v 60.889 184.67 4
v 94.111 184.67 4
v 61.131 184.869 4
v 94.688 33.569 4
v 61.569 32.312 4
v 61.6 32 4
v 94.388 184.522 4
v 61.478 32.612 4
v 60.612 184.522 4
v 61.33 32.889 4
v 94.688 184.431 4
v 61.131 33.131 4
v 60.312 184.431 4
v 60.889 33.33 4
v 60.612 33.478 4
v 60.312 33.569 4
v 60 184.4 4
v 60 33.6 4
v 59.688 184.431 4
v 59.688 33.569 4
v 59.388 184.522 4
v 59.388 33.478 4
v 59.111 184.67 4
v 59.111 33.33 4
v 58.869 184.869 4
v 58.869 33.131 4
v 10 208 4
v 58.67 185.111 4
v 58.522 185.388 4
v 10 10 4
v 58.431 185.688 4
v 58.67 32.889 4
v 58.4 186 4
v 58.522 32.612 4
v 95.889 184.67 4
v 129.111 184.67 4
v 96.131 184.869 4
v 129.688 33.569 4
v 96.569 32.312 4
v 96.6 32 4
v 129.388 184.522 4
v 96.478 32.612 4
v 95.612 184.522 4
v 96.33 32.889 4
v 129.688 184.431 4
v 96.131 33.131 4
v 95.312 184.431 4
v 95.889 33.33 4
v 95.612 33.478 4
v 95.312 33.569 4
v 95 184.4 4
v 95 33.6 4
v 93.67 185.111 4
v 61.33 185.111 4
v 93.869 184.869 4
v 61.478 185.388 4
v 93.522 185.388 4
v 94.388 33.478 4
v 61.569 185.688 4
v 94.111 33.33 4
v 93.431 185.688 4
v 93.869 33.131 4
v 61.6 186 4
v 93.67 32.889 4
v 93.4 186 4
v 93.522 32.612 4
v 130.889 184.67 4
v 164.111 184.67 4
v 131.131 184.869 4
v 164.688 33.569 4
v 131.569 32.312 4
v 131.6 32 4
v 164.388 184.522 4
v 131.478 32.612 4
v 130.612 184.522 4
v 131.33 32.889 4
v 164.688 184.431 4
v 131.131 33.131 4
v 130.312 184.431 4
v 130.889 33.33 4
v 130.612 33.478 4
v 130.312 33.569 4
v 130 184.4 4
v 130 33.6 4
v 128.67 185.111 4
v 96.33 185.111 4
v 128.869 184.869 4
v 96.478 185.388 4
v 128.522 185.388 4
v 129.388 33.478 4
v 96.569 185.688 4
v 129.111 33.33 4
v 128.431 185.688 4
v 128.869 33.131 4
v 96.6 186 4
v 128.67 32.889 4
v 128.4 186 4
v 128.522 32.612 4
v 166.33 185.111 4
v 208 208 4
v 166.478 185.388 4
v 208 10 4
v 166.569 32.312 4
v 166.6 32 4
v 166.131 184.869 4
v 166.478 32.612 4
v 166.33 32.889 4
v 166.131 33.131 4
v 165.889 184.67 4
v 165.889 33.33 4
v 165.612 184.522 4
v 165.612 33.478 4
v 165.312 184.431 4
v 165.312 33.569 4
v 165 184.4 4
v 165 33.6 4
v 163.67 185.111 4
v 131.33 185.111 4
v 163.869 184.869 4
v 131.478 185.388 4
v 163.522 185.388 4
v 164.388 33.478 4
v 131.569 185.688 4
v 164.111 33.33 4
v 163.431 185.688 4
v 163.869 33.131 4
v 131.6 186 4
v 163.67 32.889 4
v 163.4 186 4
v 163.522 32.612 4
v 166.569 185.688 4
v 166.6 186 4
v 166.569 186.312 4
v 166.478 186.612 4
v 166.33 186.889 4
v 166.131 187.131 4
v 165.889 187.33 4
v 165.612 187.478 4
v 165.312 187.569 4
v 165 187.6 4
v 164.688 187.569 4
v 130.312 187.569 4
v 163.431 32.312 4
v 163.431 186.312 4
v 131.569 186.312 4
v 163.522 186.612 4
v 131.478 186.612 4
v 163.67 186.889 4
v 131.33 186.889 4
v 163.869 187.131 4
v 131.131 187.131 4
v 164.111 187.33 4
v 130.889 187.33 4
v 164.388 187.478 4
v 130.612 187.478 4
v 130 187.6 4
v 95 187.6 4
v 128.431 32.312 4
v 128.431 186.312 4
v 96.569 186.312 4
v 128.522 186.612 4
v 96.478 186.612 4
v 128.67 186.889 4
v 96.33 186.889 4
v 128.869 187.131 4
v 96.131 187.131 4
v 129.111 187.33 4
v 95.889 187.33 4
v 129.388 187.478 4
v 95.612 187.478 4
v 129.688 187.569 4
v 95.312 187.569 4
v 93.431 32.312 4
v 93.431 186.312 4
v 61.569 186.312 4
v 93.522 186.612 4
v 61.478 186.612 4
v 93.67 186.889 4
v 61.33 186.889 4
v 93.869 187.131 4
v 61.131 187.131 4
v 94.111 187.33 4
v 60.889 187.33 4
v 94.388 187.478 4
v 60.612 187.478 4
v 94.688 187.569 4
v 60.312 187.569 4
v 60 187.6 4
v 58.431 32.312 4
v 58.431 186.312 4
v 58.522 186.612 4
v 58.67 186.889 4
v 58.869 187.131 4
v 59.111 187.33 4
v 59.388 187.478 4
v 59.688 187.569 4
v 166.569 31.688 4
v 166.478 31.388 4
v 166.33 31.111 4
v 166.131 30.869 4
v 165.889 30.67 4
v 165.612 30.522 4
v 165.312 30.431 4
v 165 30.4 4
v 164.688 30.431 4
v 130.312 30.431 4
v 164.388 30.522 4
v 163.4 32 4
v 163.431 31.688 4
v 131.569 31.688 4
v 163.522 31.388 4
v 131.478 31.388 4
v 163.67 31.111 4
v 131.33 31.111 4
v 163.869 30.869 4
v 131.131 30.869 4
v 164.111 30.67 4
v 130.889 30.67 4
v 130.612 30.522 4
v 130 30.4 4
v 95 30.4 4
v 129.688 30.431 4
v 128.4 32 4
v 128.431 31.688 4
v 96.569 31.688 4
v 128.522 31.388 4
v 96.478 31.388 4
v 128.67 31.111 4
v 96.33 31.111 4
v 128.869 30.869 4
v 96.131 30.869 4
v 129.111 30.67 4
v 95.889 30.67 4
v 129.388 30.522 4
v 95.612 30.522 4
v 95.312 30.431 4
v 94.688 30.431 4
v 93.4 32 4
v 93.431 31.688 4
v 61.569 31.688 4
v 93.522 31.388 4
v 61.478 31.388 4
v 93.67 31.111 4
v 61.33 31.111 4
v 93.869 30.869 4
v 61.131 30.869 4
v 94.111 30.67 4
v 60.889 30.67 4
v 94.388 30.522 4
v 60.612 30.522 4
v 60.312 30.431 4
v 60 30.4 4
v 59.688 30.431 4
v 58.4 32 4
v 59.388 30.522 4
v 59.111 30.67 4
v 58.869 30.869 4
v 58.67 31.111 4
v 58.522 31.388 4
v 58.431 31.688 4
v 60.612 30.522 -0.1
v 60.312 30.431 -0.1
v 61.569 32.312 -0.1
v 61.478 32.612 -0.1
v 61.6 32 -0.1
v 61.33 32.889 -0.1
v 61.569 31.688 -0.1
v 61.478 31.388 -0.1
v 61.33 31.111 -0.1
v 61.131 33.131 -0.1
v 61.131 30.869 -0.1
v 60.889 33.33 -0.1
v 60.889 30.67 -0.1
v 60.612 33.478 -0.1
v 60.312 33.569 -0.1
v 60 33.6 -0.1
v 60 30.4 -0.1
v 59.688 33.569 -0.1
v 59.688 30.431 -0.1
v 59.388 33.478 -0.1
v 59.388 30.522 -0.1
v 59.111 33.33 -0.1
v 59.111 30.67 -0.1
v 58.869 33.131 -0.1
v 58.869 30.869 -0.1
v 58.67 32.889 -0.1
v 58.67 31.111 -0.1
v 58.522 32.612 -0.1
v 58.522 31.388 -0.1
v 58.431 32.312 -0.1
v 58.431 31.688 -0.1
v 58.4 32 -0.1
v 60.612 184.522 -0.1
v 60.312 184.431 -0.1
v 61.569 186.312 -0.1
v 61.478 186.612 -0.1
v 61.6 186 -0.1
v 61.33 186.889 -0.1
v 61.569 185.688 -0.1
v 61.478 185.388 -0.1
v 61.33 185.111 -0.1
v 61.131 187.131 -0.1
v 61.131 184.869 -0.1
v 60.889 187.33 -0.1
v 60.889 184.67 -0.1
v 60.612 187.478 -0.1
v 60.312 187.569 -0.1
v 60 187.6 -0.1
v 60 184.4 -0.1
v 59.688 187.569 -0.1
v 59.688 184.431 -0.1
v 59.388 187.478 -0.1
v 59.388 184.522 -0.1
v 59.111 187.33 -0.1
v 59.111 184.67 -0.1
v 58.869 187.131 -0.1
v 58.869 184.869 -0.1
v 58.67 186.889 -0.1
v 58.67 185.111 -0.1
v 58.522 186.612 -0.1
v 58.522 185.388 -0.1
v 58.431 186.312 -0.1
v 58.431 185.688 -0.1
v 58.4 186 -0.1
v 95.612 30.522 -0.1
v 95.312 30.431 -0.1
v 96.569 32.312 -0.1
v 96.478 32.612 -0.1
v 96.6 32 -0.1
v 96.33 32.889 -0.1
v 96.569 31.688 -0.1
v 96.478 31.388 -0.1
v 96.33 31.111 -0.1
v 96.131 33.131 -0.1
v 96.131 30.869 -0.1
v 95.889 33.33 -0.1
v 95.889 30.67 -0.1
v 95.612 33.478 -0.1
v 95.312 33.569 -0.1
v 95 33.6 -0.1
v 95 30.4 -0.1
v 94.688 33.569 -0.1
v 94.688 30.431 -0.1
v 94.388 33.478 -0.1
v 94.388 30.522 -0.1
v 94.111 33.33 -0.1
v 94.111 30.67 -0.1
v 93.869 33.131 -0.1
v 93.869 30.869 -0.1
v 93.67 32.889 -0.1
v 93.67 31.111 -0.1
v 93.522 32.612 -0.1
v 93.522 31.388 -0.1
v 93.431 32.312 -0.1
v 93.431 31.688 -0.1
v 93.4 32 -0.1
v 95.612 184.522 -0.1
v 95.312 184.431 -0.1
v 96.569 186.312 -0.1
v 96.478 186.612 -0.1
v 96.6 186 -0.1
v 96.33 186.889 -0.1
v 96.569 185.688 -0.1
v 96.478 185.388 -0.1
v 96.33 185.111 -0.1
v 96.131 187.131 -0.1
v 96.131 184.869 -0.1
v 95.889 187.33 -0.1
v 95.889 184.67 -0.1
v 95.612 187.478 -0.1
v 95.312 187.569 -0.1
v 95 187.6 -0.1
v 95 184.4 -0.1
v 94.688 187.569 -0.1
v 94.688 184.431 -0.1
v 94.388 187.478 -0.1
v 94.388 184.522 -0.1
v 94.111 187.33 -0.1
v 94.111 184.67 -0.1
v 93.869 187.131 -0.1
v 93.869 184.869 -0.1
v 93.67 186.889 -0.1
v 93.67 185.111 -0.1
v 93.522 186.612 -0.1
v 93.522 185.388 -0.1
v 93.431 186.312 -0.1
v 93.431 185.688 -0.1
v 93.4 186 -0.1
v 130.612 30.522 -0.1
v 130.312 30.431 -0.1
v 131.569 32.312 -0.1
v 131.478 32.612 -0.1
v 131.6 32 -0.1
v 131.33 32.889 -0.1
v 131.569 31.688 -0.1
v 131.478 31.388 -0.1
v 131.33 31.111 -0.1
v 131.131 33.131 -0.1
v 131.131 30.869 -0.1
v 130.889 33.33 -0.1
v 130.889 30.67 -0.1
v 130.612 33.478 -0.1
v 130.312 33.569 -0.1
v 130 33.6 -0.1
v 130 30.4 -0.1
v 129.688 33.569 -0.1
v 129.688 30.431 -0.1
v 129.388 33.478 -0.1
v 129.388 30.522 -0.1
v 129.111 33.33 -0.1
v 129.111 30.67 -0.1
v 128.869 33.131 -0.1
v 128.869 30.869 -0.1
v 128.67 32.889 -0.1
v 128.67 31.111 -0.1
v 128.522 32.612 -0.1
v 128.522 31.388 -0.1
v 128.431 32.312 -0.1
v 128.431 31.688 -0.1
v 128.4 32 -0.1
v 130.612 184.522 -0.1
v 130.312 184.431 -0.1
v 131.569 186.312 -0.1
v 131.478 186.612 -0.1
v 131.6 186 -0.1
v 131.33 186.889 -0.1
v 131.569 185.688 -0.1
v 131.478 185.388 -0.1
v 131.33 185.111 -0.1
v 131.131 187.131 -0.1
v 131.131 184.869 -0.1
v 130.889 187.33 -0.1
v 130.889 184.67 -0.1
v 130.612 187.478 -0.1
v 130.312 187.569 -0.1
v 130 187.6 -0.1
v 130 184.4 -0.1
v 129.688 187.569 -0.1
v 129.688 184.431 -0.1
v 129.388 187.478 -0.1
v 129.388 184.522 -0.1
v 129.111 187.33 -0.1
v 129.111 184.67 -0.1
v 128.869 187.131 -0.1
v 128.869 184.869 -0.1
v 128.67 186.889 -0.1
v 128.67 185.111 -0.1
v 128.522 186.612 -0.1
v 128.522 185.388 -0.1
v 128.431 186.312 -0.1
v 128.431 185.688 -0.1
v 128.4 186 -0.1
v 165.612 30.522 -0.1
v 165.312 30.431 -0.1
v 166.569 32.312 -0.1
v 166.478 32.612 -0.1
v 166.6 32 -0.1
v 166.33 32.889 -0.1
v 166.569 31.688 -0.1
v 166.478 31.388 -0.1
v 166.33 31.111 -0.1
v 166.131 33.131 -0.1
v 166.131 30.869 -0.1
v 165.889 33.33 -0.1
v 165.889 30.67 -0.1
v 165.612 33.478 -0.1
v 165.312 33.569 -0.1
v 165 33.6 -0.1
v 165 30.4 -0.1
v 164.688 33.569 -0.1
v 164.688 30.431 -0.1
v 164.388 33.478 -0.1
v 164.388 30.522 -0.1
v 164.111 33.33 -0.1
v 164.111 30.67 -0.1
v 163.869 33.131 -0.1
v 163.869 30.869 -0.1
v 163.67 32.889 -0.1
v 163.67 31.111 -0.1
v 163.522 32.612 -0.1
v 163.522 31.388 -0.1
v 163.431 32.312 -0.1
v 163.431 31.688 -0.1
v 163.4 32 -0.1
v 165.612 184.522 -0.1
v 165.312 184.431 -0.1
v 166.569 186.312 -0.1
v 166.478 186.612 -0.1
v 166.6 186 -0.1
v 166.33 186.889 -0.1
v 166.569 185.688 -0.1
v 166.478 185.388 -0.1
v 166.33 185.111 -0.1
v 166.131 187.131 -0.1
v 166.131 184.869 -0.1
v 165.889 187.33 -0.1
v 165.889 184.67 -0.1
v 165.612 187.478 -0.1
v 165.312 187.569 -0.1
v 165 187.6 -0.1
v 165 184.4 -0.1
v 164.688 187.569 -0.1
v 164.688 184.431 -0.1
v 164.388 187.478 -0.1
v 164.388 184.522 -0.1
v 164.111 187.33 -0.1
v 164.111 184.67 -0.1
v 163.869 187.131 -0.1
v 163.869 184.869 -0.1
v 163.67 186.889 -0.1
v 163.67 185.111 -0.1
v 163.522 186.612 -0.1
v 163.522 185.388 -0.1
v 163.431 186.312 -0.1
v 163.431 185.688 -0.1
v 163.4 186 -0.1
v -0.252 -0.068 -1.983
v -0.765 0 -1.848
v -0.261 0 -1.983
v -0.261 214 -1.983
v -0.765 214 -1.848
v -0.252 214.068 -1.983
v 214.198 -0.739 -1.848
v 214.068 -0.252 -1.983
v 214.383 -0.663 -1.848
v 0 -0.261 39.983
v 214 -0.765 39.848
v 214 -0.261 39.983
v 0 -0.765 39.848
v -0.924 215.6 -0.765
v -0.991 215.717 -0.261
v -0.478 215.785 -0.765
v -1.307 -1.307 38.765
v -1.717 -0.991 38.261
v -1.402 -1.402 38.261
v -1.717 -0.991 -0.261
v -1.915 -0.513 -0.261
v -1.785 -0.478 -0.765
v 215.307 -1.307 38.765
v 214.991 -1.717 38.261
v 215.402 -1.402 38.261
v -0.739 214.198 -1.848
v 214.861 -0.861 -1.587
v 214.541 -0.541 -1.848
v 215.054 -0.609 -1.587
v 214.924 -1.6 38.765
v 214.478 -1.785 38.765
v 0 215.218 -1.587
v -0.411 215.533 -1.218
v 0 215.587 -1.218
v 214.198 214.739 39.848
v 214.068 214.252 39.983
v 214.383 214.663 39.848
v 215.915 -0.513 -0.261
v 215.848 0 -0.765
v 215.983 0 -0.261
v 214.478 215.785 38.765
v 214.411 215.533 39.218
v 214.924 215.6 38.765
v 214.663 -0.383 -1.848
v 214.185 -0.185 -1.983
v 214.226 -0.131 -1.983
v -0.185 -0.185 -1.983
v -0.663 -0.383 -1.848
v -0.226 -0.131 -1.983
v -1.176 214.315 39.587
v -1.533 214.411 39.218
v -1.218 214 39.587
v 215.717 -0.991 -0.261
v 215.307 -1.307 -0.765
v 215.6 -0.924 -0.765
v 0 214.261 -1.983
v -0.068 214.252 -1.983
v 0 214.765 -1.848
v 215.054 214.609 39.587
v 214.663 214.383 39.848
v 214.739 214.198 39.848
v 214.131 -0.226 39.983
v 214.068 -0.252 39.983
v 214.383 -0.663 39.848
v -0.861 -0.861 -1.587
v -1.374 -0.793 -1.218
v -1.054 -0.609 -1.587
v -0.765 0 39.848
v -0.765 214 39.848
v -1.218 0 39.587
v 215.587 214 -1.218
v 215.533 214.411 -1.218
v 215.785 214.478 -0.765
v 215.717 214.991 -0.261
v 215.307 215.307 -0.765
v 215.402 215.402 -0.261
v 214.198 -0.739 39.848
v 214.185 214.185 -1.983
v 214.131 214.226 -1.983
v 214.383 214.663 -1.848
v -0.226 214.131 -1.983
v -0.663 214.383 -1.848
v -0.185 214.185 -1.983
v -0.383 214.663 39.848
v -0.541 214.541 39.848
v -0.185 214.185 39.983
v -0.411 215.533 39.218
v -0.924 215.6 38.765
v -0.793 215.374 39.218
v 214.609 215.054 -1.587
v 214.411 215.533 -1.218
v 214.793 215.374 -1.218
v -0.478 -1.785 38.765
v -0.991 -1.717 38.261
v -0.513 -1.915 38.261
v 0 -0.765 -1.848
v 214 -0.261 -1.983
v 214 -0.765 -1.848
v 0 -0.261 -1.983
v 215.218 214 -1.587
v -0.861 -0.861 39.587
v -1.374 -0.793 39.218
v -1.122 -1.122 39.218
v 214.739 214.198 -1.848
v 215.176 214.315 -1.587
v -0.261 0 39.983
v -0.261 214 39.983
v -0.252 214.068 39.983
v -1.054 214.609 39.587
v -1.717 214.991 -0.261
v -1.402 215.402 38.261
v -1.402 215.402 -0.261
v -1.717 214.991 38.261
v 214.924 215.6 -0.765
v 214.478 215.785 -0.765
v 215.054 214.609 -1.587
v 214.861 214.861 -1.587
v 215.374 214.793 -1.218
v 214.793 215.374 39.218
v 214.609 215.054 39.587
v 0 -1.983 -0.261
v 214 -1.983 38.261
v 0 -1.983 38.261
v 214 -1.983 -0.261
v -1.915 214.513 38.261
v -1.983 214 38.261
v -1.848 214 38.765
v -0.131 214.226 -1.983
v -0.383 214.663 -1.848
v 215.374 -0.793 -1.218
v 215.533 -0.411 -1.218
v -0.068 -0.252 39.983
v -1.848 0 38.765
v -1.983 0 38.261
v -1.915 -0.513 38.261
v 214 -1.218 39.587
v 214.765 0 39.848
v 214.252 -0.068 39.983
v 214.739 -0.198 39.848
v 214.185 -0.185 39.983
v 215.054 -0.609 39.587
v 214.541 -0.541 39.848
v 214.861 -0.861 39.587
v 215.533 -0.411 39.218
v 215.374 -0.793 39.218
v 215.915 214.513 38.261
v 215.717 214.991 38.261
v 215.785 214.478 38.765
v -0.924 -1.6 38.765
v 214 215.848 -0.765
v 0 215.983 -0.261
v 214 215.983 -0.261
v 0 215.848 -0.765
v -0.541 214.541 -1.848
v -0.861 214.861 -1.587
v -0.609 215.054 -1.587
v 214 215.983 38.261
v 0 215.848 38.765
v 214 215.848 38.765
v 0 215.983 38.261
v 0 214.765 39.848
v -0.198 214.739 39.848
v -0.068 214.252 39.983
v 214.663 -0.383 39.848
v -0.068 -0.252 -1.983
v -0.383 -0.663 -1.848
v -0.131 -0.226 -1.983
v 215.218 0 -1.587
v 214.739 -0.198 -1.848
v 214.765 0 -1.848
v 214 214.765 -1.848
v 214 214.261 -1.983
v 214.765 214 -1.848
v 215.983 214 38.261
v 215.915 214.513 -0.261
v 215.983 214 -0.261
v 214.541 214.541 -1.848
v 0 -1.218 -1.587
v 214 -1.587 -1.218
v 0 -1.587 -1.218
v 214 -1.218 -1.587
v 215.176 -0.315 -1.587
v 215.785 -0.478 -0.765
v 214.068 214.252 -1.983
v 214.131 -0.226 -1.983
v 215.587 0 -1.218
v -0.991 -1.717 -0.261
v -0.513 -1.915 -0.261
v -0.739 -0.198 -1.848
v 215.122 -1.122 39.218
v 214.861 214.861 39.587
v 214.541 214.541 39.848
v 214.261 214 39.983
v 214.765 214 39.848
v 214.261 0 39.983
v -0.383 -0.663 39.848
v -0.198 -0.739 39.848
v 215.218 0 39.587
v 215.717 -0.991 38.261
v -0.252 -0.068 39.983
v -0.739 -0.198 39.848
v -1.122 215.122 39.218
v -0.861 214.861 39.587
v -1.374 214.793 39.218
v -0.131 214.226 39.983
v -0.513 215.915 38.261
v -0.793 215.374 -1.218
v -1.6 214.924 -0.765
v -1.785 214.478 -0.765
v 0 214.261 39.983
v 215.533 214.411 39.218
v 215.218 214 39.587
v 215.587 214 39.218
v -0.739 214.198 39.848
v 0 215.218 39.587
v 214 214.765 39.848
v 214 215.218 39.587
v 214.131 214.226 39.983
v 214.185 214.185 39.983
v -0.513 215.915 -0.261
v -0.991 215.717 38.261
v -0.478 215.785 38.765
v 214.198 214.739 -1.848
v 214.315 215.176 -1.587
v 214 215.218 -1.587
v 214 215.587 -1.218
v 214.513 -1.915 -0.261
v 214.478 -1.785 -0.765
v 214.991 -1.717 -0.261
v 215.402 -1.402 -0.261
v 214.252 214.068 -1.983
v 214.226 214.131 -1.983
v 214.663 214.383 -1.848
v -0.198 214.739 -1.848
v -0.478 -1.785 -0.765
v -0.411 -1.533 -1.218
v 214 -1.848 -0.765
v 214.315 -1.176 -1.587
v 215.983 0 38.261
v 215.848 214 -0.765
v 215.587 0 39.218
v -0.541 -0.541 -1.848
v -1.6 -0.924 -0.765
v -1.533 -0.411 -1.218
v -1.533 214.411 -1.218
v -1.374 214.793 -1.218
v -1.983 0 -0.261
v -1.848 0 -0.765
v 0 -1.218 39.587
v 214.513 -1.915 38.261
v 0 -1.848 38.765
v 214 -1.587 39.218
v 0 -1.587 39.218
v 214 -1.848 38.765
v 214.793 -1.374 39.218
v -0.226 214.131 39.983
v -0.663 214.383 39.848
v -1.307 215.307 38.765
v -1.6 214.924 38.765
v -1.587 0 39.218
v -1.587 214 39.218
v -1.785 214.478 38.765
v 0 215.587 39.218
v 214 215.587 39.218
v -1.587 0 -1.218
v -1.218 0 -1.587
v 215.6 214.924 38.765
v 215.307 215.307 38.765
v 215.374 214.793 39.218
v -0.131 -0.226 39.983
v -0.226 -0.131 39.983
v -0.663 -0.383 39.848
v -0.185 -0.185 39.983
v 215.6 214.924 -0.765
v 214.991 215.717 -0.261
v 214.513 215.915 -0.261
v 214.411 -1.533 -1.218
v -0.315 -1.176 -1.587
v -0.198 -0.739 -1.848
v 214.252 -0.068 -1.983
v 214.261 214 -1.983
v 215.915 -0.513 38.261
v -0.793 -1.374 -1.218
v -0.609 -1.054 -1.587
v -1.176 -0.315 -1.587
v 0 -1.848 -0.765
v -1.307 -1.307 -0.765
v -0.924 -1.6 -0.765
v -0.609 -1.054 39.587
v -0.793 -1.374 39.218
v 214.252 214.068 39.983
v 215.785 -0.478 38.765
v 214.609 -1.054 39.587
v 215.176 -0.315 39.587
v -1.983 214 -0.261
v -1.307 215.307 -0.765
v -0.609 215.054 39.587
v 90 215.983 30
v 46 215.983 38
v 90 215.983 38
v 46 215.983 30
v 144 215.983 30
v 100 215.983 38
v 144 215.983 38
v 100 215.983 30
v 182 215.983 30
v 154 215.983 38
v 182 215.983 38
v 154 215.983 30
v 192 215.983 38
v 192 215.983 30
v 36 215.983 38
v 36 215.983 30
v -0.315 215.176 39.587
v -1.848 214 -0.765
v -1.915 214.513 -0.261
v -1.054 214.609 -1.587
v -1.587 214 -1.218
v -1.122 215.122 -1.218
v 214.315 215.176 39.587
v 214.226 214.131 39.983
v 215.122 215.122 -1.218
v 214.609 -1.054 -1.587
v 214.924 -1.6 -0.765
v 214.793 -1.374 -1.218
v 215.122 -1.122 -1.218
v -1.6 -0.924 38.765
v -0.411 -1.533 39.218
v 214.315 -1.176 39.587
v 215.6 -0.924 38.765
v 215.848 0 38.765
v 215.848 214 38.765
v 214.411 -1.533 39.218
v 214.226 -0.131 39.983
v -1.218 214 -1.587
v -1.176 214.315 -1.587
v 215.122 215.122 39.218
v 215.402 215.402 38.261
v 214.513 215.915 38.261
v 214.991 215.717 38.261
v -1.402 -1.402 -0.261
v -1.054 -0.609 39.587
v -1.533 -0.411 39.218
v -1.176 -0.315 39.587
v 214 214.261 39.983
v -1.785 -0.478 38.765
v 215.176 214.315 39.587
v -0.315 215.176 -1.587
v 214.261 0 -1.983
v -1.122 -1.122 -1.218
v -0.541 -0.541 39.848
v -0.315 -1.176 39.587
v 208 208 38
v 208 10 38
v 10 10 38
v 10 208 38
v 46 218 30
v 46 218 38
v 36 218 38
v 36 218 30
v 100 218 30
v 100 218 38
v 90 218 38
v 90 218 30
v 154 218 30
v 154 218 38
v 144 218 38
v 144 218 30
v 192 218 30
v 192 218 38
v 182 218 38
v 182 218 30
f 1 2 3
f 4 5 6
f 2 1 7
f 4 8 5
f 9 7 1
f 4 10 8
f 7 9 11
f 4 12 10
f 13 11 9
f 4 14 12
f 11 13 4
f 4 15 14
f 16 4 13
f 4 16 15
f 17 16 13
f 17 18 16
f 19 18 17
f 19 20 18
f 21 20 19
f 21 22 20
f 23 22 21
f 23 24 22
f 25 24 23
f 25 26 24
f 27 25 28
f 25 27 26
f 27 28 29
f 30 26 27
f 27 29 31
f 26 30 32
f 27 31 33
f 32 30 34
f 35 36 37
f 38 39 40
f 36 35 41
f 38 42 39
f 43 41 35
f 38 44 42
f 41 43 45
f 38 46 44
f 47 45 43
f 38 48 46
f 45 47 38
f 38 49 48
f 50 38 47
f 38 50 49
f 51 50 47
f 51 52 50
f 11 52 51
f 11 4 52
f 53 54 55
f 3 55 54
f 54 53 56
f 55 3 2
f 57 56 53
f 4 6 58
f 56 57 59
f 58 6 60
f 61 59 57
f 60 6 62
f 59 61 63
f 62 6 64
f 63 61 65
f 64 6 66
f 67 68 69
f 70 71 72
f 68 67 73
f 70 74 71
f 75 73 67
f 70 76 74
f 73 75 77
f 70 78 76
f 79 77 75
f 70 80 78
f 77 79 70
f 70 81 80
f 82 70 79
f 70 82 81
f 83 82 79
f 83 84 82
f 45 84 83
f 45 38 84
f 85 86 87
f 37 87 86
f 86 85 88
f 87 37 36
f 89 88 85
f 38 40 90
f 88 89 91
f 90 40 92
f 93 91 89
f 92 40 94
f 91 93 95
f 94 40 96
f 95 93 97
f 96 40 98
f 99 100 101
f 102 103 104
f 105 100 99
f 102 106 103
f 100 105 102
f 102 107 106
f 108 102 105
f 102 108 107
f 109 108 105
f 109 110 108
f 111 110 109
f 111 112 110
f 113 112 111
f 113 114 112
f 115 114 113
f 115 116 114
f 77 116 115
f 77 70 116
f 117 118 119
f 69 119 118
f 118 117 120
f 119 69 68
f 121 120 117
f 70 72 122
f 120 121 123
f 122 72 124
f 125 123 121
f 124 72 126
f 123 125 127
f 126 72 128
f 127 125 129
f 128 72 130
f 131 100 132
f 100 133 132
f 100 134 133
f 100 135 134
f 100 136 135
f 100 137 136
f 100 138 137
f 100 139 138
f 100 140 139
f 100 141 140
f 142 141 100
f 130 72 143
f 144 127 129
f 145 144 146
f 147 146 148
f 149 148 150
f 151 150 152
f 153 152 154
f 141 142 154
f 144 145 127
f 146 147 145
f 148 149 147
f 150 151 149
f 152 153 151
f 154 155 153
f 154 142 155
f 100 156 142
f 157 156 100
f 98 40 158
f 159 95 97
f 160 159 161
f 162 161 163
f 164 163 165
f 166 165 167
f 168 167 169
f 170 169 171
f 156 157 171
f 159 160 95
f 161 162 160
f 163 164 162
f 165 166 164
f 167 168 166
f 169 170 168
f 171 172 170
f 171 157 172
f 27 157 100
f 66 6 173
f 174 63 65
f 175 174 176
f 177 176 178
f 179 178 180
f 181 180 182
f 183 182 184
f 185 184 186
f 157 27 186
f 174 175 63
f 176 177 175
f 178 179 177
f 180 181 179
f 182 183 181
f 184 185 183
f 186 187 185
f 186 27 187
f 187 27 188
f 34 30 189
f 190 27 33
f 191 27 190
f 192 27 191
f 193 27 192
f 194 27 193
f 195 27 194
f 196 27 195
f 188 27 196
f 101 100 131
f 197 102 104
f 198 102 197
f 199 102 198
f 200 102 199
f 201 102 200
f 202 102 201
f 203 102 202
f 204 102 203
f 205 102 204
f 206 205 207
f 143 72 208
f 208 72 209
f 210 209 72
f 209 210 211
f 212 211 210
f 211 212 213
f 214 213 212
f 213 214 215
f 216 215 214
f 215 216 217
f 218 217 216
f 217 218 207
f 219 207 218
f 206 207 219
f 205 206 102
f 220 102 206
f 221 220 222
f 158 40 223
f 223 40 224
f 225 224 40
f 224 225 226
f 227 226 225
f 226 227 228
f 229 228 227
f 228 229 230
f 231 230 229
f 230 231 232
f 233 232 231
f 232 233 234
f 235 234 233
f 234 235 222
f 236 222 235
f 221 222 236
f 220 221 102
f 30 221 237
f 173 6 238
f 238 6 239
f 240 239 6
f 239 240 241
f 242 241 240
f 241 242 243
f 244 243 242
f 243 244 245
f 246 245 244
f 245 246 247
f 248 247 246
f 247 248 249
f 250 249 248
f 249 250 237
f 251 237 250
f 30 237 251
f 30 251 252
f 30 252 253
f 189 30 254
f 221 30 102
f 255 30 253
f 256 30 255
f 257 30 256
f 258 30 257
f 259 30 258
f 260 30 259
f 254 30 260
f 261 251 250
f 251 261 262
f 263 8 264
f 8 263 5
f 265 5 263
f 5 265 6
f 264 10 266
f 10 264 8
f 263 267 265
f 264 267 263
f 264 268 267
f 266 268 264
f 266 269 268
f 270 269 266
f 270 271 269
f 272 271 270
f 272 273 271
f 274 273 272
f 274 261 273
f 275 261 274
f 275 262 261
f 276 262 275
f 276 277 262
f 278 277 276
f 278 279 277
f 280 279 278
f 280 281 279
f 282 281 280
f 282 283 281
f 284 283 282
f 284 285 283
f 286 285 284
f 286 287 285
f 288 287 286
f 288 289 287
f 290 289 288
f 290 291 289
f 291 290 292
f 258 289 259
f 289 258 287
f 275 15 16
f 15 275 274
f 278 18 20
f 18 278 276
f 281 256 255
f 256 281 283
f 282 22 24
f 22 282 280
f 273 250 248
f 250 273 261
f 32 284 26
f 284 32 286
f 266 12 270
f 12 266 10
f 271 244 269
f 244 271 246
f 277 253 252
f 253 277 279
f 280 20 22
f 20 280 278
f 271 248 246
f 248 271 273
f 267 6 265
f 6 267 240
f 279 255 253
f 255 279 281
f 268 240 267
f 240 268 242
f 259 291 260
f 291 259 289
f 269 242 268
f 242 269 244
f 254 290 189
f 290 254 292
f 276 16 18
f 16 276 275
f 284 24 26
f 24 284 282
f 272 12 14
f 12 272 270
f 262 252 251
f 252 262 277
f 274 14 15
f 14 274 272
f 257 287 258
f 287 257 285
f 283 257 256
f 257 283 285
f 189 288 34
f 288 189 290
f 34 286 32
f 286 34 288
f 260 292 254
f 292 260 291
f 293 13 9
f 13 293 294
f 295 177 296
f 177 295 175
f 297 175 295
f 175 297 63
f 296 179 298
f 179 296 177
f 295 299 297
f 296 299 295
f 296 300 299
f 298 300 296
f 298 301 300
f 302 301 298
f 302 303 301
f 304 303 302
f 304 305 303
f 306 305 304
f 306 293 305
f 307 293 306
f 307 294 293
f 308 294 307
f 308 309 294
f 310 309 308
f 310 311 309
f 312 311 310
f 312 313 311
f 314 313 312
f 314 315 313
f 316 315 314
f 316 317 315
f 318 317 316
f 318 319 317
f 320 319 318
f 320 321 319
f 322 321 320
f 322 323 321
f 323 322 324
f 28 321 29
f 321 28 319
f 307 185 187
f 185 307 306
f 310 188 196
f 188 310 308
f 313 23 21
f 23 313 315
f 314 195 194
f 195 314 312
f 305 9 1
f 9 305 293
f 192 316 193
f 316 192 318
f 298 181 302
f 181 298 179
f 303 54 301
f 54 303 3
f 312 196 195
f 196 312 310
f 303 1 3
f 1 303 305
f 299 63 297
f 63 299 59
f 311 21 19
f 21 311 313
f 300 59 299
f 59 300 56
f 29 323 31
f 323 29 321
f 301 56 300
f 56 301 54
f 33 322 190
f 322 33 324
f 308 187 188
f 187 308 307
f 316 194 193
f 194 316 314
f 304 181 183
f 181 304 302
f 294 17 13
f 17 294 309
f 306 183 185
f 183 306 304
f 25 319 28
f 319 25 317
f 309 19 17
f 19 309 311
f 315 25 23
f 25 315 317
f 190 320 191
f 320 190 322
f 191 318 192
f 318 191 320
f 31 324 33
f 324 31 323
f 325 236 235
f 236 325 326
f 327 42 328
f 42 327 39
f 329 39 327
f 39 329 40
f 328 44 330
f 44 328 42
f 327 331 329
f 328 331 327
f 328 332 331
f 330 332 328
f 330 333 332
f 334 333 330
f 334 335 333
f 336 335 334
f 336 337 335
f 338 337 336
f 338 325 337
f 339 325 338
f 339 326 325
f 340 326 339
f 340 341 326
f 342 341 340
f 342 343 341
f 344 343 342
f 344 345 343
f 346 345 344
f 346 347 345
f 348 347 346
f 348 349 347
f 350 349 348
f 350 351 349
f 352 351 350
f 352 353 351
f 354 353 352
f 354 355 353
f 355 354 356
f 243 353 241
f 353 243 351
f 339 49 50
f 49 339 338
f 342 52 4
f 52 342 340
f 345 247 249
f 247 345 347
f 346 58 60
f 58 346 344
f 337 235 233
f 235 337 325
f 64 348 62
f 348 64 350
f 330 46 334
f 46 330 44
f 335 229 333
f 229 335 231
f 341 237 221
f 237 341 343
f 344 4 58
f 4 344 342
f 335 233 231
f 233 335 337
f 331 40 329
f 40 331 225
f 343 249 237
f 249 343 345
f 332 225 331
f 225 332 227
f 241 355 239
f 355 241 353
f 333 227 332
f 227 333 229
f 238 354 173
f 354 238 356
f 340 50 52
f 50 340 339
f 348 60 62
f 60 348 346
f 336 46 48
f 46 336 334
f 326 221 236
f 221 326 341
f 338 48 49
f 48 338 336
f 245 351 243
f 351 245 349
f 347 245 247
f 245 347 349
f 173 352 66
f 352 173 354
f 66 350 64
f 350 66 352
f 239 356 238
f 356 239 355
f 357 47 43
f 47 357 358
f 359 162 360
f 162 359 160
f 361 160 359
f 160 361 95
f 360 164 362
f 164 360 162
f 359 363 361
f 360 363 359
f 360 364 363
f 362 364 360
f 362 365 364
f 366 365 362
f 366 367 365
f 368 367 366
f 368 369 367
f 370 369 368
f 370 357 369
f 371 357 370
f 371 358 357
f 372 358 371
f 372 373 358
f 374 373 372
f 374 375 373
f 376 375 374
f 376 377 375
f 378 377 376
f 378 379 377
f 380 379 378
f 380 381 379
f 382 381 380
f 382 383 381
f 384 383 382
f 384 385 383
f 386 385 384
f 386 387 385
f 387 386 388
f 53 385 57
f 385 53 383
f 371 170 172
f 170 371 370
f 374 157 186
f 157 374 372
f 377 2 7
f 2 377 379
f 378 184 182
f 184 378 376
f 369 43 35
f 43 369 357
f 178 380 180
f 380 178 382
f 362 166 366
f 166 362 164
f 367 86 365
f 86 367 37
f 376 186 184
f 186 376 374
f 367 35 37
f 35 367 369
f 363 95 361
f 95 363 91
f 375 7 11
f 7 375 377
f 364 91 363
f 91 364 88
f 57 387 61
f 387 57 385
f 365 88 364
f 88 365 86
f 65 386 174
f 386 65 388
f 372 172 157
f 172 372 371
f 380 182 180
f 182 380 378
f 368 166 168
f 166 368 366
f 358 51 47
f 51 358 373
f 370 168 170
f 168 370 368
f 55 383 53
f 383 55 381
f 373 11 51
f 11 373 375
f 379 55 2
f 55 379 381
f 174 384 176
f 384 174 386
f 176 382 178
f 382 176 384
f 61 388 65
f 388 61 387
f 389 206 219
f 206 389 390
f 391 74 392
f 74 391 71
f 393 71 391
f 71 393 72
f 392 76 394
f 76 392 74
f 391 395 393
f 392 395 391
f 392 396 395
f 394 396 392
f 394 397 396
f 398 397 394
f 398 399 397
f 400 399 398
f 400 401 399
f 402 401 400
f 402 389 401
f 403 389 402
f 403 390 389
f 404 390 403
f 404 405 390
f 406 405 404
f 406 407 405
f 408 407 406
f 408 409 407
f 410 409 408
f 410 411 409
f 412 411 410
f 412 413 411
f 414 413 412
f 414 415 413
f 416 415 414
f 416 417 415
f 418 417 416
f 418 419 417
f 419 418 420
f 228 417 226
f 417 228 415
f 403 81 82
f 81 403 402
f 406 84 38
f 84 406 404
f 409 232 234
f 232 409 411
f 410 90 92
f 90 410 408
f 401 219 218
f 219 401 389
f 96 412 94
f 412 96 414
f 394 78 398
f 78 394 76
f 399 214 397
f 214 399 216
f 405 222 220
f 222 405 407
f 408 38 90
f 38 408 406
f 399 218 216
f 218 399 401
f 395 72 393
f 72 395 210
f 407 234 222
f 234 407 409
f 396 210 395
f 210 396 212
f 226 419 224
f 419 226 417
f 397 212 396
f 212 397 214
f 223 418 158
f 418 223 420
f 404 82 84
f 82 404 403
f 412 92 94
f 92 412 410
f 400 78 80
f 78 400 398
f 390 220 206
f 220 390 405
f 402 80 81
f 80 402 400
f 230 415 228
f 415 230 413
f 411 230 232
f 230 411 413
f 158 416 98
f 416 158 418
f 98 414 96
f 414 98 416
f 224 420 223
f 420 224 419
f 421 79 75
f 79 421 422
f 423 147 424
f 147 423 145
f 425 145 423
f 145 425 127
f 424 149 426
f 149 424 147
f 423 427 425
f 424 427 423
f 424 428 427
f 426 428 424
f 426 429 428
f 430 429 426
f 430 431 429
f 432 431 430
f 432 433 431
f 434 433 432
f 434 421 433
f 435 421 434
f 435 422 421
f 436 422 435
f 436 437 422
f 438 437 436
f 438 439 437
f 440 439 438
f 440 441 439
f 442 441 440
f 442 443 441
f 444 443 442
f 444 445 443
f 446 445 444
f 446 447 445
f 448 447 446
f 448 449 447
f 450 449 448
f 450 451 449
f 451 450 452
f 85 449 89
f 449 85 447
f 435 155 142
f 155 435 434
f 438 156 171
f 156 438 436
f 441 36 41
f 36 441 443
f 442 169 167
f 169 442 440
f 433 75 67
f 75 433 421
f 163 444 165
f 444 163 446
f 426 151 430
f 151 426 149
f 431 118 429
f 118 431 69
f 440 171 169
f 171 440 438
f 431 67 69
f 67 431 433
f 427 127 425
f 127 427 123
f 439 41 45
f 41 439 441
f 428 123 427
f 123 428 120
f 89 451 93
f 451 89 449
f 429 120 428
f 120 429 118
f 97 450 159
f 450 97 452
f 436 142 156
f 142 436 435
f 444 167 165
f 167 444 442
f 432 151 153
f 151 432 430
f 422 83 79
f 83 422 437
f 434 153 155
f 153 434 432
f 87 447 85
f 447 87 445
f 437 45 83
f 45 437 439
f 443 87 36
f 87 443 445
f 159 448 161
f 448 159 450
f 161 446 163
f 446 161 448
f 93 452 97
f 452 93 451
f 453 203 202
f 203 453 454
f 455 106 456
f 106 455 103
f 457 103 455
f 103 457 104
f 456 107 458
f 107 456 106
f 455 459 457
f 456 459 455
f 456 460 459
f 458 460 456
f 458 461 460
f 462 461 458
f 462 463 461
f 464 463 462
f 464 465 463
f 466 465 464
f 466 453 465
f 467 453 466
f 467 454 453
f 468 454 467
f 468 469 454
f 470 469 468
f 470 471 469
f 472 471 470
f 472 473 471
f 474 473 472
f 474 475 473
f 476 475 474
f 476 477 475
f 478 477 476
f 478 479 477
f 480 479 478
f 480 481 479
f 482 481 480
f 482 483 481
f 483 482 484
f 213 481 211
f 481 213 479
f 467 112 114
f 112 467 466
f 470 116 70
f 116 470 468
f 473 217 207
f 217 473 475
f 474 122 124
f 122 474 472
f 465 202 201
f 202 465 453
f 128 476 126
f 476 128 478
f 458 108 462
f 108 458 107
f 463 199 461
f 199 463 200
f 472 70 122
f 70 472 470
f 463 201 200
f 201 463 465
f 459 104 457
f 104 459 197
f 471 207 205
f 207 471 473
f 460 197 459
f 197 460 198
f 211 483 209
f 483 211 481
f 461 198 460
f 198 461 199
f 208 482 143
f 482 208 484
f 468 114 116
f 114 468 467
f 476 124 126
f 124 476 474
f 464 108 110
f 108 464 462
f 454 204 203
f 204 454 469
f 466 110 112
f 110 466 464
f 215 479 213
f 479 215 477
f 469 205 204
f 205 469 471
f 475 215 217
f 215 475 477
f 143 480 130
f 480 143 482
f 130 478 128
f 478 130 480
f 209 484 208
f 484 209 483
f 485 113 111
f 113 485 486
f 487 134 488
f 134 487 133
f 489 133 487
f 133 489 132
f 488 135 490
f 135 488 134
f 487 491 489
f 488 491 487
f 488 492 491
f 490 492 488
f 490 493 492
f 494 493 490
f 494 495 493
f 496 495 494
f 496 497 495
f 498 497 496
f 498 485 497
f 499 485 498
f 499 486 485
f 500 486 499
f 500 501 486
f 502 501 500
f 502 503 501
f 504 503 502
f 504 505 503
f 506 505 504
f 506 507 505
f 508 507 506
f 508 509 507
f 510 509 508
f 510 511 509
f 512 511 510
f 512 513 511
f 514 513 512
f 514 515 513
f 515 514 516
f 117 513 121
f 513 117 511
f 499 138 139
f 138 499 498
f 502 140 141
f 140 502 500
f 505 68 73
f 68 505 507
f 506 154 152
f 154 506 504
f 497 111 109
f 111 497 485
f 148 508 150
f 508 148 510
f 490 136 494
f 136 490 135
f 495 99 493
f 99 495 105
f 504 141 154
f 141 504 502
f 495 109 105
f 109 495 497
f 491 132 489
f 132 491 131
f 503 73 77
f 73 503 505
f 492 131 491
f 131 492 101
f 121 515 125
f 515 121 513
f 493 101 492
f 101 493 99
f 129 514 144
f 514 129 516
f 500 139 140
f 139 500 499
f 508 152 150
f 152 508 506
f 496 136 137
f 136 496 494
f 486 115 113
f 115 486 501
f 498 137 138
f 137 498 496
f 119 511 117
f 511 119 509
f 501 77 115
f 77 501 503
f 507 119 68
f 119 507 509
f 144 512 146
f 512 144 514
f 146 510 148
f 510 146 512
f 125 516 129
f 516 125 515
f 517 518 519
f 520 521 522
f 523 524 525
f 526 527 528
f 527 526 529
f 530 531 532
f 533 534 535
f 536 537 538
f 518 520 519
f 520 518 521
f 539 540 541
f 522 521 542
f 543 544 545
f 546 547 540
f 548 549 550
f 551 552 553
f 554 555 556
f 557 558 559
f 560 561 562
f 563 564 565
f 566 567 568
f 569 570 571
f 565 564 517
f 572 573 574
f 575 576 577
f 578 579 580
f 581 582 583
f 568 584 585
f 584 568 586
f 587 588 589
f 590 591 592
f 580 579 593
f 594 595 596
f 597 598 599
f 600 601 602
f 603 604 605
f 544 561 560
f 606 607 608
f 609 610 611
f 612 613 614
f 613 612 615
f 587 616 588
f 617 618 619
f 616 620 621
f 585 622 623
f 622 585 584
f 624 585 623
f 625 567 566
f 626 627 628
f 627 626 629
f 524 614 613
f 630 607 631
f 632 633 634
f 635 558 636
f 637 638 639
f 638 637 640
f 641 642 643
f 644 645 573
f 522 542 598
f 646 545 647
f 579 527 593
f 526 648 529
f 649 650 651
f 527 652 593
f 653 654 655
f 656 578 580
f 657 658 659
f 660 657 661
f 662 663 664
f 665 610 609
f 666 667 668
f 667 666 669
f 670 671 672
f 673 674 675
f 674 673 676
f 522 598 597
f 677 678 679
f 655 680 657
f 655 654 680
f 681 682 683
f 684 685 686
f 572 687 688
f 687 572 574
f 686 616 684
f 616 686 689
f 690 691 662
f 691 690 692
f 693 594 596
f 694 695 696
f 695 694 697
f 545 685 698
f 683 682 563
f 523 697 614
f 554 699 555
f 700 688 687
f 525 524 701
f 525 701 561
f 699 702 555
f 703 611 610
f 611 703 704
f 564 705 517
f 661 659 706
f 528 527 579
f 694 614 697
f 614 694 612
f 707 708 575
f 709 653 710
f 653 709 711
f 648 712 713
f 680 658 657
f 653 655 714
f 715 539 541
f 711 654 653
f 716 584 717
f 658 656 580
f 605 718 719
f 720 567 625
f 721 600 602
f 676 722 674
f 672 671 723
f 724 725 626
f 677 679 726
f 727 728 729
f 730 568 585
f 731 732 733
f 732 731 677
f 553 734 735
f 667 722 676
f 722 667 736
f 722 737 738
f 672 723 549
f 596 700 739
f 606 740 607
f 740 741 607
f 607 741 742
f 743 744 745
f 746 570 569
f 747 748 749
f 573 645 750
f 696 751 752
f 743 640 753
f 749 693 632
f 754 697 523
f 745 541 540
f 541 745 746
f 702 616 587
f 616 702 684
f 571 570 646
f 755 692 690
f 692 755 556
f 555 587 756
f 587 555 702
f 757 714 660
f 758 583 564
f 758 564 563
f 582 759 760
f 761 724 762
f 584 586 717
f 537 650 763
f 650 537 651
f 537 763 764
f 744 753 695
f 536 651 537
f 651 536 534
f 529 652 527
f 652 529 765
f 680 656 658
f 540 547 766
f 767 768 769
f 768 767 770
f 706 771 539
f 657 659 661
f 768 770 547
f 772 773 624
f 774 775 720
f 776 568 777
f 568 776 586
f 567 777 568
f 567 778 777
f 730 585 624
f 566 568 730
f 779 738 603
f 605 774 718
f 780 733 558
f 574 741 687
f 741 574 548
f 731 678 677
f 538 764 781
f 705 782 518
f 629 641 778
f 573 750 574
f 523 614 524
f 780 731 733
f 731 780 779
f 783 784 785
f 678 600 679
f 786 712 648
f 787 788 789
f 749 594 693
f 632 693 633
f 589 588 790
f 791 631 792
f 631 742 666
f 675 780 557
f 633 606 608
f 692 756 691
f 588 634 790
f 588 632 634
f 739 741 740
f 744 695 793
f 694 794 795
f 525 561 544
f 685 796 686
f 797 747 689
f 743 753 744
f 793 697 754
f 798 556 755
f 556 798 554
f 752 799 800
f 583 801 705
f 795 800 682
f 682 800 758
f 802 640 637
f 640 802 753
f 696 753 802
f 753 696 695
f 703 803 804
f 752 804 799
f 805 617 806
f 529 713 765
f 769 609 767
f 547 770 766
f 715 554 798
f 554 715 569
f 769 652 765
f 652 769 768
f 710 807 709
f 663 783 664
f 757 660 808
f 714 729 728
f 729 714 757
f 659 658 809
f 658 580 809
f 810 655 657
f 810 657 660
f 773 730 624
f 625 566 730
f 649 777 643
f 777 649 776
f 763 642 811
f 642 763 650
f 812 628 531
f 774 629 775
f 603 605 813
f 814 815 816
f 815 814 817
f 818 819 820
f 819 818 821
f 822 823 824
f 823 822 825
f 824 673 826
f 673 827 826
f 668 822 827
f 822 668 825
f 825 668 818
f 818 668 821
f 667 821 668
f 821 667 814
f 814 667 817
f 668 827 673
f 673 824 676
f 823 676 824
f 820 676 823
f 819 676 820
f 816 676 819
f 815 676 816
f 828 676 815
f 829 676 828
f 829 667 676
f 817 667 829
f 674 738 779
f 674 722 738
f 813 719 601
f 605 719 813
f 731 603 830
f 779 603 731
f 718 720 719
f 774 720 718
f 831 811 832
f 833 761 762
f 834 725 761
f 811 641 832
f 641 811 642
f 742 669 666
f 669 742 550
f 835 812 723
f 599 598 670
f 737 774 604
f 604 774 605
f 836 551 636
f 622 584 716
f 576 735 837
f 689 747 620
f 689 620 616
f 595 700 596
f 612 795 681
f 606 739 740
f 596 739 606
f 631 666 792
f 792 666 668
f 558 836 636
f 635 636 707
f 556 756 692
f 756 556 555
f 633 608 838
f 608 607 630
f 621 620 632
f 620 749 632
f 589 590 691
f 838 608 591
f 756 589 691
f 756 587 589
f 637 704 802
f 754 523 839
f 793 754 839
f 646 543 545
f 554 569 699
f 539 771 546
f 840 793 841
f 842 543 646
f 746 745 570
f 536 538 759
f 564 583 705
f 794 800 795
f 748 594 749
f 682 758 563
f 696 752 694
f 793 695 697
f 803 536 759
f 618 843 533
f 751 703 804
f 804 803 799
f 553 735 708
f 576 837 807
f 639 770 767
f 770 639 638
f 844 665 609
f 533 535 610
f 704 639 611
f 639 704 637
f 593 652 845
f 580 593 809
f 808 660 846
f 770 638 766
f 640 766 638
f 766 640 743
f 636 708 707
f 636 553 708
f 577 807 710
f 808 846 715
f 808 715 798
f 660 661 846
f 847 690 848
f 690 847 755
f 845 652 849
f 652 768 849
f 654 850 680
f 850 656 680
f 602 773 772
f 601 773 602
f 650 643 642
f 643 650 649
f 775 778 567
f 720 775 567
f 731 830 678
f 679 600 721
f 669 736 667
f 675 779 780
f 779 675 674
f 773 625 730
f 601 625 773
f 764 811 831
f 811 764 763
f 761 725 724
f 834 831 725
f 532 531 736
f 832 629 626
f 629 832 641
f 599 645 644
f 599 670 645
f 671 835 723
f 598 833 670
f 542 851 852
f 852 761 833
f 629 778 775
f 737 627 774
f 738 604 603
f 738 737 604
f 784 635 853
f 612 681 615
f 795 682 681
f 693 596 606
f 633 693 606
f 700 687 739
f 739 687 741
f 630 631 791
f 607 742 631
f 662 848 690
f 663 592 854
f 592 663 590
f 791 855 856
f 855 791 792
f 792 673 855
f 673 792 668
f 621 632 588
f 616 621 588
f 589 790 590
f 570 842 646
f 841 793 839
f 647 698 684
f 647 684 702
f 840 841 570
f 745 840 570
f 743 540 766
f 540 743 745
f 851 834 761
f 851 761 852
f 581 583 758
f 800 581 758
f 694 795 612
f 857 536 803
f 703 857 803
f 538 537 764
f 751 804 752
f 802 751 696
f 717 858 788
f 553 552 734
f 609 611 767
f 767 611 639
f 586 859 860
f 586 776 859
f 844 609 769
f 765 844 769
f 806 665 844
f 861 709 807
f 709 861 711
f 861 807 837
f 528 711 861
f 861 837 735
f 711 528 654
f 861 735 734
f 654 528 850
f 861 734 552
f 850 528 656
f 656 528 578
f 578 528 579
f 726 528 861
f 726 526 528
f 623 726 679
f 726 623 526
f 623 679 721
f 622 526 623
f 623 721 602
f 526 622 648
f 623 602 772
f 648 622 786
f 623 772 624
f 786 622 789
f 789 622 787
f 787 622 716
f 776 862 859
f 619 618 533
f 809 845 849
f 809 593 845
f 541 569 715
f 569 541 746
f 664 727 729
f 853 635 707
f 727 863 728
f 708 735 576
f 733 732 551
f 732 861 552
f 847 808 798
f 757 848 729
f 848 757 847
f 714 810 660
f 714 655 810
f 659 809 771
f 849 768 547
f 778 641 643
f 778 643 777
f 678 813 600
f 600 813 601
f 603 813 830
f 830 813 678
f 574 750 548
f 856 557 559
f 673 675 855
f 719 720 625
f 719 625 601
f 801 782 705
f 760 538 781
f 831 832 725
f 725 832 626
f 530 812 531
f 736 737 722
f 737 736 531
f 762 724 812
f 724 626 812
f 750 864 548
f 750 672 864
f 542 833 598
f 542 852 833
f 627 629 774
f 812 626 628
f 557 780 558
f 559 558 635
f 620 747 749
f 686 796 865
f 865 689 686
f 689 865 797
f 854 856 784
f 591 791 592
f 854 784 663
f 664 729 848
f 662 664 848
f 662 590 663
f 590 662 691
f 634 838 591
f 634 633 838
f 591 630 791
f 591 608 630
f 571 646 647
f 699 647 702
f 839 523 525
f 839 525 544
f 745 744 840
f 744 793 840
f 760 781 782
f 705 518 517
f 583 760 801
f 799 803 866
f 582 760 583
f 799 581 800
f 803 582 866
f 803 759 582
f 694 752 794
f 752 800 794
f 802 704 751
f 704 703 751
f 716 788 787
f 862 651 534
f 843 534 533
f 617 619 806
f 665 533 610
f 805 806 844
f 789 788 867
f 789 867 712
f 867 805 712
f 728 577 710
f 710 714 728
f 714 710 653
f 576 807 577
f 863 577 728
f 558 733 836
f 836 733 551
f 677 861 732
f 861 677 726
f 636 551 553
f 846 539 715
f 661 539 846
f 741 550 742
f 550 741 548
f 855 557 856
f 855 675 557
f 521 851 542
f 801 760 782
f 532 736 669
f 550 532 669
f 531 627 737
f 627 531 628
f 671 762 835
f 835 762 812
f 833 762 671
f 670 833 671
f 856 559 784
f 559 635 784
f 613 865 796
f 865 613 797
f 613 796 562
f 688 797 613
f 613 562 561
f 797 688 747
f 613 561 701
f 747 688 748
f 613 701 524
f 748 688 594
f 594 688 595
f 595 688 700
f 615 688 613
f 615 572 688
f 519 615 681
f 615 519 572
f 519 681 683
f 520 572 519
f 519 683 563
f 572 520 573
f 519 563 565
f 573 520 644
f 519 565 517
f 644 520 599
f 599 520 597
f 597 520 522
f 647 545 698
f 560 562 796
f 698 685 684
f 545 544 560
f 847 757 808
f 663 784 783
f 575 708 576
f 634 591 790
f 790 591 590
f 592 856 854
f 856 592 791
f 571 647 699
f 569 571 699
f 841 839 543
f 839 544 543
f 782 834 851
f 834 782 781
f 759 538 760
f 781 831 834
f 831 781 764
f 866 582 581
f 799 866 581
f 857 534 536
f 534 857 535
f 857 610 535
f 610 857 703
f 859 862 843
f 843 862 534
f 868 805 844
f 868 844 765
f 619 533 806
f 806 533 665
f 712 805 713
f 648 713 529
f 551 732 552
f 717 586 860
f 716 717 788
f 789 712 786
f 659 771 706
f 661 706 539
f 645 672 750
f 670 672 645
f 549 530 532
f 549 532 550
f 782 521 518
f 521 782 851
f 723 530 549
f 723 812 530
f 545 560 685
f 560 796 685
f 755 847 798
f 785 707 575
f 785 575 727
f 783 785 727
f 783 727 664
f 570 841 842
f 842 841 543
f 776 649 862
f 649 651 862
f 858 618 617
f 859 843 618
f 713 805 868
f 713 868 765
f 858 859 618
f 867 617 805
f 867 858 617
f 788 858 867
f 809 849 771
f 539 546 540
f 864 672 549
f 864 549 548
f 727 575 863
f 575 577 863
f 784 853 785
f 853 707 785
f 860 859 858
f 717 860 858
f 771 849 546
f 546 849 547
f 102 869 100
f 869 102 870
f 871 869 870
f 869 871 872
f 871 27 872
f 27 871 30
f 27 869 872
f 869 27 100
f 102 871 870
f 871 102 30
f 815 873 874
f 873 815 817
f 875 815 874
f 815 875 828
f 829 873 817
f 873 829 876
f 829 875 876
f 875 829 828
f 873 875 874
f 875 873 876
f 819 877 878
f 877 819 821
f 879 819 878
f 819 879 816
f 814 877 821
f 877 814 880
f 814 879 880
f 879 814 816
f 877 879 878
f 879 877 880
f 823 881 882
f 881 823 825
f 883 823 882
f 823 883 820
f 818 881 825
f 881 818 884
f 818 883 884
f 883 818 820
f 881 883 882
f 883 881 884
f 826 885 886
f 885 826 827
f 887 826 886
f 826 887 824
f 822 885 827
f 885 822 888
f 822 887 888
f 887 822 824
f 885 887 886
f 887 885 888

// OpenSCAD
// file: ../../f1_1/cad/common.scad
// Shared constants and primitives for F1.1 mechanical design.

filament_diameter = 1.75;
ptfe_inner_diameter = 2.0;
mount_hole_diameter = 3.2;
mount_slot_width = 3.5;
mount_slot_length = 10.0;

module rounded_block(size_vec, radius = 2) {
    x = size_vec[0];
    y = size_vec[1];
    z = size_vec[2];

    minkowski() {
        cube([x - (2 * radius), y - (2 * radius), z - (2 * radius)], center = false);
        sphere(r = radius, $fn = 24);
    }
}

module m3_hole(height = 12, diameter = mount_hole_diameter) {
    cylinder(h = height, d = diameter, center = false, $fn = 32);
}

module slot_hole(length = mount_slot_length, width = mount_slot_width, height = 8) {
    hull() {
        translate([0, 0, 0]) {
            cylinder(h = height, d = width, center = false, $fn = 24);
        }
        translate([length, 0, 0]) {
            cylinder(h = height, d = width, center = false, $fn = 24);
        }
    }
}

module filament_channel(length = 30, diameter = ptfe_inner_diameter, axis = "x") {
    if (axis == "x") {
        rotate([0, 90, 0]) {
            cylinder(h = length, d = diameter, center = true, $fn = 36);
        }
    } else if (axis == "y") {
        rotate([90, 0, 0]) {
            cylinder(h = length, d = diameter, center = true, $fn = 36);
        }
    } else {
        cylinder(h = length, d = diameter, center = true, $fn = 36);
    }
}

module pc4_m6_fitting_port() {
    difference() {
        cylinder(h = 8, d = 8, center = false, $fn = 24);
        translate([0, 0, -0.5]) {
            cylinder(h = 9, d = 4.6, center = false, $fn = 24);
        }
    }
}

module modular_rail(width = 80, depth = 12, length = 210) {
    difference() {
        cube([length, width, depth], center = false);

        for (slot_x = [15 : 20 : length - 15]) {
            translate([slot_x, width * 0.5, 0]) {
                slot_hole(length = mount_slot_length, width = mount_slot_width, height = depth + 1);
            }
        }
    }
}
// main file
use <../../f1_1/cad/common.scad>;

// Bottom shell with cable channels, captive nuts, and snap tabs.

module enclosure_bottom() {
    difference() {
        rounded_block([218, 218, 42], radius = 2);

        // Inner cavity.
        translate([10, 10, 4]) {
            cube([198, 198, 34], center = false);
        }

        // Cable channels along left and right walls.
        translate([12, 24, 6]) {
            cube([14, 170, 10], center = false);
        }
        translate([192, 24, 6]) {
            cube([14, 170, 10], center = false);
        }

        // Captive nut slots for M3 hex nuts.
        for (x = [28, 190]) {
            for (y = [28, 190]) {
                translate([x, y, 4]) {
                    cylinder(h = 4, d = 6.2, $fn = 6);
                }
            }
        }

        // Board and bracket mounting holes.
        for (x = [60, 95, 130, 165]) {
            translate([x, 32, -0.1]) {
                m3_hole(height = 10);
            }
            translate([x, 186, -0.1]) {
                m3_hole(height = 10);
            }
        }
    }

    // Snap-fit tabs for top enclosure mating.
    for (x = [36, 90, 144, 182]) {
        translate([x, 0, 30]) {
            cube([10, 3, 8], center = false);
        }
        translate([x, 215, 30]) {
            cube([10, 3, 8], center = false);
        }
    }
}

enclosure_bottom();
